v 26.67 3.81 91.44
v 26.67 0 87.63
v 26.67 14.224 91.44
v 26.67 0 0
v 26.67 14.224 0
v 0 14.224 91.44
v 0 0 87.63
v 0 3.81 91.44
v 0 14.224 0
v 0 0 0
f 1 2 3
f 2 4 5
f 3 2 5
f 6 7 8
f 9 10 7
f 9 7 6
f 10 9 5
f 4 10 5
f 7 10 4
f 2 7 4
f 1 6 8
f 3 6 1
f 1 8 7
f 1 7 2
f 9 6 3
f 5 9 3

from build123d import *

# Parameters (mm, degrees)
SKETCH1_W           = 26.67
SKETCH1_H           = 14.224
BOSS_EXTRUDE1_DEPTH = 91.44
CHAMFER1_SIZE       = 3.81


with BuildPart() as part:
    # Sketch1 → Boss-Extrude1 (new body)
    with BuildSketch(Plane.XY):
        with Locations((13.335, 7.112)):
            Rectangle(SKETCH1_W, SKETCH1_H)
    extrude(amount=BOSS_EXTRUDE1_DEPTH)

    # Chamfer1
    chamfer1_edges = [part.edges().sort_by_distance(p)[0] for p in [
        (13.335, 0, 91.44),
    ]]
    chamfer(chamfer1_edges, length=CHAMFER1_SIZE)


solid = part.part
